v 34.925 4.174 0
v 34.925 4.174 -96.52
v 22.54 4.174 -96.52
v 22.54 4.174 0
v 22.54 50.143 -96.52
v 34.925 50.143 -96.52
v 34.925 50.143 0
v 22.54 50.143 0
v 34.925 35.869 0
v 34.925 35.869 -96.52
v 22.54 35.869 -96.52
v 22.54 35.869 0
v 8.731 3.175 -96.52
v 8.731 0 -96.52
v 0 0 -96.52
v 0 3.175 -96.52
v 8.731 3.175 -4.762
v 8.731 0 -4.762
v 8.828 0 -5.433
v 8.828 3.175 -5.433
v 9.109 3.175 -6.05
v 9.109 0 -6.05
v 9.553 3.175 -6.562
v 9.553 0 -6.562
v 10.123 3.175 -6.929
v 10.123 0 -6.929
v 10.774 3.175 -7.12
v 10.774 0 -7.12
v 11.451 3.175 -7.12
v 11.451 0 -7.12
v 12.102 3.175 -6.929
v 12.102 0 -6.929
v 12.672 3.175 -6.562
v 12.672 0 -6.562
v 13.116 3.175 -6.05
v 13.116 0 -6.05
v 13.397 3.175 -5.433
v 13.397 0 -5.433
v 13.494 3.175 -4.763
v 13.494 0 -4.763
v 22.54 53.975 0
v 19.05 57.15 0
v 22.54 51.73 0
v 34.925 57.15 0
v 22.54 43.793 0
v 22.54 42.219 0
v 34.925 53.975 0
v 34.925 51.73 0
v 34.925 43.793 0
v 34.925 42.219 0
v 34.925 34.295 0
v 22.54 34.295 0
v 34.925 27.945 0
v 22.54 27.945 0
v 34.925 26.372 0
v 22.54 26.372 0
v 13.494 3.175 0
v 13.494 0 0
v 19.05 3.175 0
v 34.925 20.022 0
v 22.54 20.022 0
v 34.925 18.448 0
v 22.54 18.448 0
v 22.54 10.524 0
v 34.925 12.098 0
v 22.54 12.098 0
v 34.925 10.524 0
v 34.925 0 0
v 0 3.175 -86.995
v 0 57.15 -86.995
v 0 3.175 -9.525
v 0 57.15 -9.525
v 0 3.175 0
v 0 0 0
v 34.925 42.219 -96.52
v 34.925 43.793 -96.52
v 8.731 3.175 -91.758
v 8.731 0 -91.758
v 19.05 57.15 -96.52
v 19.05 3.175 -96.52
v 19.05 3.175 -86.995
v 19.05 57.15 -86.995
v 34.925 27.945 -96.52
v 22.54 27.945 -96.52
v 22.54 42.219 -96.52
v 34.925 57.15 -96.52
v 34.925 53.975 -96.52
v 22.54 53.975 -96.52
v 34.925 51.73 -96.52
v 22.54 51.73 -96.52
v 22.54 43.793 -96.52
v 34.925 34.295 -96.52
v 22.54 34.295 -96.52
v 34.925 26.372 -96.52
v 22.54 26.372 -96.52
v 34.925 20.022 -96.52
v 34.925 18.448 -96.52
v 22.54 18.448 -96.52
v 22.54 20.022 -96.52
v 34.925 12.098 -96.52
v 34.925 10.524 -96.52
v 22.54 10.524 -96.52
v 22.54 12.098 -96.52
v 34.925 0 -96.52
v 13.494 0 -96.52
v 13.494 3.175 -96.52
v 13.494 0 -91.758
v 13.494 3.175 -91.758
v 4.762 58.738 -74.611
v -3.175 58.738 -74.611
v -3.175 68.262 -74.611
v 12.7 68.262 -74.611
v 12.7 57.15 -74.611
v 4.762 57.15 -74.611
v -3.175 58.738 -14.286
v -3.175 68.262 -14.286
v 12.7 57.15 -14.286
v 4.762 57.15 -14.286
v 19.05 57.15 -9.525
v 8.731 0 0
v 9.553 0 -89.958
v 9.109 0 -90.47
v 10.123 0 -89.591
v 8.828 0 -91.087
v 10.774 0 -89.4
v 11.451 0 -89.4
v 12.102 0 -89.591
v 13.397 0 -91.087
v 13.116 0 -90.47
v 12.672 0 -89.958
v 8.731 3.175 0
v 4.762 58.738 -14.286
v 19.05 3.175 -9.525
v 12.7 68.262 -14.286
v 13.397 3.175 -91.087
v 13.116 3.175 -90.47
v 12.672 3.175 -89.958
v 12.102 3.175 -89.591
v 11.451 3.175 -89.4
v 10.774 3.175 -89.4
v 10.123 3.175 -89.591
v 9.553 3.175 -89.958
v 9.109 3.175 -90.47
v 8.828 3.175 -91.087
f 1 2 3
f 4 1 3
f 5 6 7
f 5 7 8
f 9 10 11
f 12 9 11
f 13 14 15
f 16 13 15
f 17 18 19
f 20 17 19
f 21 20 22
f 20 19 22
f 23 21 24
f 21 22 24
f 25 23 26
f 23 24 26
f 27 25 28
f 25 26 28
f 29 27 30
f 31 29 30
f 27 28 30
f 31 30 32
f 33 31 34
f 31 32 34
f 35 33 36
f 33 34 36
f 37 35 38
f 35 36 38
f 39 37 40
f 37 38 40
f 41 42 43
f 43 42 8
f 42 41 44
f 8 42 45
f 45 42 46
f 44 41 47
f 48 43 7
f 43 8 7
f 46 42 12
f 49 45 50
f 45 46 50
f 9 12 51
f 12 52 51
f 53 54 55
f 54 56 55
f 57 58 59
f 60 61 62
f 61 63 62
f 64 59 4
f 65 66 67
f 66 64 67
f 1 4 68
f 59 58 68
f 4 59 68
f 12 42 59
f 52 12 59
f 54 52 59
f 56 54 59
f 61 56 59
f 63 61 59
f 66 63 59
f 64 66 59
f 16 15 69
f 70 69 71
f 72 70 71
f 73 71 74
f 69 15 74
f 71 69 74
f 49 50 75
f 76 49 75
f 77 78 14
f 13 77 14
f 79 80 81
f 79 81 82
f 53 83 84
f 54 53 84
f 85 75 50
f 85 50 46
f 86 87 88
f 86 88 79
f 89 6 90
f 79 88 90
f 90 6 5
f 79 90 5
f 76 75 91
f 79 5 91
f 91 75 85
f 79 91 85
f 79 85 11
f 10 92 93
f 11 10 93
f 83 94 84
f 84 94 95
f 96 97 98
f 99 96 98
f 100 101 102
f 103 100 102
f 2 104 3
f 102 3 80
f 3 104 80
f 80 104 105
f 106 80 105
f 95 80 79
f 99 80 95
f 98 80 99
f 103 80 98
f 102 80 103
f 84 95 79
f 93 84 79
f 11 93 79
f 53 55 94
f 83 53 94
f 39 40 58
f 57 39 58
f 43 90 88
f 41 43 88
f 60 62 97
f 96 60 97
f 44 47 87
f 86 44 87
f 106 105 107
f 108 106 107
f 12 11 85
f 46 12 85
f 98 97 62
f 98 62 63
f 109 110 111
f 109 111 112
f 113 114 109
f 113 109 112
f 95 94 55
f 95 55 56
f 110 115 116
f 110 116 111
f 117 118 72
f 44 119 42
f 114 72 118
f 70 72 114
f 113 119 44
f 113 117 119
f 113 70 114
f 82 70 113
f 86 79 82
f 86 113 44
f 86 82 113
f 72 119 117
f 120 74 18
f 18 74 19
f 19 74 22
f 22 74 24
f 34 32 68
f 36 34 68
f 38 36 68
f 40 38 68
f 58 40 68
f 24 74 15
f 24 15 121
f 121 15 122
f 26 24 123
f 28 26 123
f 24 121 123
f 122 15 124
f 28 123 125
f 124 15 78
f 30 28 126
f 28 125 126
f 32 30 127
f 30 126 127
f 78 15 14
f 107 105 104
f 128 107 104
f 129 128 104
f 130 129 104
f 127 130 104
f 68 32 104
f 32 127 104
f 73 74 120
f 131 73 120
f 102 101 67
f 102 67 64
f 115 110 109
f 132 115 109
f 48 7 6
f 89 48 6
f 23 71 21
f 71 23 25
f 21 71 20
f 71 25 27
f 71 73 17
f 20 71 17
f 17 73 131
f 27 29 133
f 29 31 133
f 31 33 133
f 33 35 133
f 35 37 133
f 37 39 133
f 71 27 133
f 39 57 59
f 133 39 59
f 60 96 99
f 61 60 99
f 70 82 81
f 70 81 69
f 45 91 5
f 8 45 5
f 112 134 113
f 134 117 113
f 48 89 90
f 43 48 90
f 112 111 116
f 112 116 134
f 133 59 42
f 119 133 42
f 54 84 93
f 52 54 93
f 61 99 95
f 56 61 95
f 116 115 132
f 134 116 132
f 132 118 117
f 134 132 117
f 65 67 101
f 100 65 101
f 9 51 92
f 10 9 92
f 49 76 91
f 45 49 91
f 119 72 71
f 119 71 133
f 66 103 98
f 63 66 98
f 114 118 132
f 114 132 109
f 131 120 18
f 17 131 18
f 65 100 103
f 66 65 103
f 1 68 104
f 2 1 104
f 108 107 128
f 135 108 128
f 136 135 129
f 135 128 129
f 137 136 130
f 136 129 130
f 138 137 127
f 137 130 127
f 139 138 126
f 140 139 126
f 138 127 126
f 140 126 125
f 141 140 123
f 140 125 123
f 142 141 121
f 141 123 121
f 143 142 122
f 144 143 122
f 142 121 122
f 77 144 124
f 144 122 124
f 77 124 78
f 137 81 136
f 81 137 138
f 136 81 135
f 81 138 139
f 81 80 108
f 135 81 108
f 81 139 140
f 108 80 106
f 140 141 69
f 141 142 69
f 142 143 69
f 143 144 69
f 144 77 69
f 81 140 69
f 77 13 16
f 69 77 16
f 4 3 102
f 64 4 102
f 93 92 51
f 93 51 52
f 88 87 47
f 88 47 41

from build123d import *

# Parameters (mm, degrees)
BOSS_EXTRUDE1_DEPTH = 57.15
SKETCH2_W           = 19.05
SKETCH2_H           = 53.975
CUT_EXTRUDE1_DEPTH  = 9.525
SKETCH4_W           = 19.05
SKETCH4_H           = 53.975
CUT_EXTRUDE2_DEPTH  = 9.525
SKETCH5_W           = 12.384603188
SKETCH5_H           = 6.35
SKETCH5_H_2         = 2.244857945
CUT_EXTRUDE3_DEPTH  = 96.52
SKETCH6_W           = 7.9375
SKETCH6_H           = 60.325
BOSS_EXTRUDE2_DEPTH = 1.5875
SKETCH7_W           = 15.875
SKETCH7_H           = 60.325
BOSS_EXTRUDE3_DEPTH = 9.525


with BuildPart() as part:
    # Sketch1 → Boss-Extrude1 (new body)
    with BuildSketch(Plane(origin=(0, 0, 0), x_dir=(1, 0, 0), z_dir=(0, 1, 0))):
        with BuildLine():
            Line((0, 0), (8.73125, 0))
            Line((8.73125, 0), (8.73125, 4.7625))
            ThreePointArc((8.73125, 4.7625), (11.1125, 7.14375), (13.49375, 4.7625))
            Line((13.49375, 4.7625), (13.49375, 0))
            Line((13.49375, 0), (34.925, 0))
            Line((34.925, 0), (34.925, 96.52))
            Line((34.925, 96.52), (13.49375, 96.52))
            Line((13.49375, 96.52), (13.49375, 91.7575))
            ThreePointArc((13.49375, 91.7575), (11.1125, 89.37625), (8.73125, 91.7575))
            Line((8.73125, 91.7575), (8.73125, 96.52))
            Line((8.73125, 96.52), (0, 96.52))
            Line((0, 96.52), (0, 0))
        make_face()
    extrude(amount=BOSS_EXTRUDE1_DEPTH)

    # Sketch2 → Cut-Extrude1 (cut)
    with BuildSketch(Plane.XY):
        with Locations((9.525, 30.1625)):
            Rectangle(SKETCH2_W, SKETCH2_H)
    extrude(amount=-CUT_EXTRUDE1_DEPTH, mode=Mode.SUBTRACT)

    # Sketch4 → Cut-Extrude2 (cut)
    with BuildSketch(Plane(origin=(0, 0, -96.52), x_dir=(-1, 0, 0), z_dir=(0, 0, -1))):
        with Locations((-9.525, 30.1625)):
            Rectangle(SKETCH4_W, SKETCH4_H)
    extrude(amount=-CUT_EXTRUDE2_DEPTH, mode=Mode.SUBTRACT)

    # Sketch5 → Cut-Extrude3 (cut)
    with BuildSketch(Plane(origin=(0, 0, -96.52), x_dir=(-1, 0, 0), z_dir=(0, 0, -1))):
        with Locations((-28.732698406, 7.349133021)):
            Rectangle(SKETCH5_W, SKETCH5_H)
        with Locations((-28.732698406, 15.272834828)):
            Rectangle(SKETCH5_W, SKETCH5_H)
        with Locations((-28.732698406, 23.196536634)):
            Rectangle(SKETCH5_W, SKETCH5_H)
        with Locations((-28.732698406, 31.120238441)):
            Rectangle(SKETCH5_W, SKETCH5_H)
        with Locations((-28.732698406, 39.043940248)):
            Rectangle(SKETCH5_W, SKETCH5_H)
        with Locations((-28.732698406, 46.967642055)):
            Rectangle(SKETCH5_W, SKETCH5_H)
        with Locations((-28.732698406, 52.852571028)):
            Rectangle(SKETCH5_W, SKETCH5_H_2)
    extrude(amount=-CUT_EXTRUDE3_DEPTH, mode=Mode.SUBTRACT)

    # Sketch6 → Boss-Extrude2 (add)
    with BuildSketch(Plane(origin=(0, 57.15, 0), x_dir=(1, 0, 0), z_dir=(0, 1, 0))):
        with Locations((8.73125, 44.448135035)):
            Rectangle(SKETCH6_W, SKETCH6_H)
    extrude(amount=BOSS_EXTRUDE2_DEPTH)

    # Sketch7 → Boss-Extrude3 (add)
    with BuildSketch(Plane(origin=(0, 58.7375, 0), x_dir=(1, 0, 0), z_dir=(0, 1, 0))):
        with Locations((4.7625, 44.448135035)):
            Rectangle(SKETCH7_W, SKETCH7_H)
    extrude(amount=BOSS_EXTRUDE3_DEPTH)


solid = part.part
